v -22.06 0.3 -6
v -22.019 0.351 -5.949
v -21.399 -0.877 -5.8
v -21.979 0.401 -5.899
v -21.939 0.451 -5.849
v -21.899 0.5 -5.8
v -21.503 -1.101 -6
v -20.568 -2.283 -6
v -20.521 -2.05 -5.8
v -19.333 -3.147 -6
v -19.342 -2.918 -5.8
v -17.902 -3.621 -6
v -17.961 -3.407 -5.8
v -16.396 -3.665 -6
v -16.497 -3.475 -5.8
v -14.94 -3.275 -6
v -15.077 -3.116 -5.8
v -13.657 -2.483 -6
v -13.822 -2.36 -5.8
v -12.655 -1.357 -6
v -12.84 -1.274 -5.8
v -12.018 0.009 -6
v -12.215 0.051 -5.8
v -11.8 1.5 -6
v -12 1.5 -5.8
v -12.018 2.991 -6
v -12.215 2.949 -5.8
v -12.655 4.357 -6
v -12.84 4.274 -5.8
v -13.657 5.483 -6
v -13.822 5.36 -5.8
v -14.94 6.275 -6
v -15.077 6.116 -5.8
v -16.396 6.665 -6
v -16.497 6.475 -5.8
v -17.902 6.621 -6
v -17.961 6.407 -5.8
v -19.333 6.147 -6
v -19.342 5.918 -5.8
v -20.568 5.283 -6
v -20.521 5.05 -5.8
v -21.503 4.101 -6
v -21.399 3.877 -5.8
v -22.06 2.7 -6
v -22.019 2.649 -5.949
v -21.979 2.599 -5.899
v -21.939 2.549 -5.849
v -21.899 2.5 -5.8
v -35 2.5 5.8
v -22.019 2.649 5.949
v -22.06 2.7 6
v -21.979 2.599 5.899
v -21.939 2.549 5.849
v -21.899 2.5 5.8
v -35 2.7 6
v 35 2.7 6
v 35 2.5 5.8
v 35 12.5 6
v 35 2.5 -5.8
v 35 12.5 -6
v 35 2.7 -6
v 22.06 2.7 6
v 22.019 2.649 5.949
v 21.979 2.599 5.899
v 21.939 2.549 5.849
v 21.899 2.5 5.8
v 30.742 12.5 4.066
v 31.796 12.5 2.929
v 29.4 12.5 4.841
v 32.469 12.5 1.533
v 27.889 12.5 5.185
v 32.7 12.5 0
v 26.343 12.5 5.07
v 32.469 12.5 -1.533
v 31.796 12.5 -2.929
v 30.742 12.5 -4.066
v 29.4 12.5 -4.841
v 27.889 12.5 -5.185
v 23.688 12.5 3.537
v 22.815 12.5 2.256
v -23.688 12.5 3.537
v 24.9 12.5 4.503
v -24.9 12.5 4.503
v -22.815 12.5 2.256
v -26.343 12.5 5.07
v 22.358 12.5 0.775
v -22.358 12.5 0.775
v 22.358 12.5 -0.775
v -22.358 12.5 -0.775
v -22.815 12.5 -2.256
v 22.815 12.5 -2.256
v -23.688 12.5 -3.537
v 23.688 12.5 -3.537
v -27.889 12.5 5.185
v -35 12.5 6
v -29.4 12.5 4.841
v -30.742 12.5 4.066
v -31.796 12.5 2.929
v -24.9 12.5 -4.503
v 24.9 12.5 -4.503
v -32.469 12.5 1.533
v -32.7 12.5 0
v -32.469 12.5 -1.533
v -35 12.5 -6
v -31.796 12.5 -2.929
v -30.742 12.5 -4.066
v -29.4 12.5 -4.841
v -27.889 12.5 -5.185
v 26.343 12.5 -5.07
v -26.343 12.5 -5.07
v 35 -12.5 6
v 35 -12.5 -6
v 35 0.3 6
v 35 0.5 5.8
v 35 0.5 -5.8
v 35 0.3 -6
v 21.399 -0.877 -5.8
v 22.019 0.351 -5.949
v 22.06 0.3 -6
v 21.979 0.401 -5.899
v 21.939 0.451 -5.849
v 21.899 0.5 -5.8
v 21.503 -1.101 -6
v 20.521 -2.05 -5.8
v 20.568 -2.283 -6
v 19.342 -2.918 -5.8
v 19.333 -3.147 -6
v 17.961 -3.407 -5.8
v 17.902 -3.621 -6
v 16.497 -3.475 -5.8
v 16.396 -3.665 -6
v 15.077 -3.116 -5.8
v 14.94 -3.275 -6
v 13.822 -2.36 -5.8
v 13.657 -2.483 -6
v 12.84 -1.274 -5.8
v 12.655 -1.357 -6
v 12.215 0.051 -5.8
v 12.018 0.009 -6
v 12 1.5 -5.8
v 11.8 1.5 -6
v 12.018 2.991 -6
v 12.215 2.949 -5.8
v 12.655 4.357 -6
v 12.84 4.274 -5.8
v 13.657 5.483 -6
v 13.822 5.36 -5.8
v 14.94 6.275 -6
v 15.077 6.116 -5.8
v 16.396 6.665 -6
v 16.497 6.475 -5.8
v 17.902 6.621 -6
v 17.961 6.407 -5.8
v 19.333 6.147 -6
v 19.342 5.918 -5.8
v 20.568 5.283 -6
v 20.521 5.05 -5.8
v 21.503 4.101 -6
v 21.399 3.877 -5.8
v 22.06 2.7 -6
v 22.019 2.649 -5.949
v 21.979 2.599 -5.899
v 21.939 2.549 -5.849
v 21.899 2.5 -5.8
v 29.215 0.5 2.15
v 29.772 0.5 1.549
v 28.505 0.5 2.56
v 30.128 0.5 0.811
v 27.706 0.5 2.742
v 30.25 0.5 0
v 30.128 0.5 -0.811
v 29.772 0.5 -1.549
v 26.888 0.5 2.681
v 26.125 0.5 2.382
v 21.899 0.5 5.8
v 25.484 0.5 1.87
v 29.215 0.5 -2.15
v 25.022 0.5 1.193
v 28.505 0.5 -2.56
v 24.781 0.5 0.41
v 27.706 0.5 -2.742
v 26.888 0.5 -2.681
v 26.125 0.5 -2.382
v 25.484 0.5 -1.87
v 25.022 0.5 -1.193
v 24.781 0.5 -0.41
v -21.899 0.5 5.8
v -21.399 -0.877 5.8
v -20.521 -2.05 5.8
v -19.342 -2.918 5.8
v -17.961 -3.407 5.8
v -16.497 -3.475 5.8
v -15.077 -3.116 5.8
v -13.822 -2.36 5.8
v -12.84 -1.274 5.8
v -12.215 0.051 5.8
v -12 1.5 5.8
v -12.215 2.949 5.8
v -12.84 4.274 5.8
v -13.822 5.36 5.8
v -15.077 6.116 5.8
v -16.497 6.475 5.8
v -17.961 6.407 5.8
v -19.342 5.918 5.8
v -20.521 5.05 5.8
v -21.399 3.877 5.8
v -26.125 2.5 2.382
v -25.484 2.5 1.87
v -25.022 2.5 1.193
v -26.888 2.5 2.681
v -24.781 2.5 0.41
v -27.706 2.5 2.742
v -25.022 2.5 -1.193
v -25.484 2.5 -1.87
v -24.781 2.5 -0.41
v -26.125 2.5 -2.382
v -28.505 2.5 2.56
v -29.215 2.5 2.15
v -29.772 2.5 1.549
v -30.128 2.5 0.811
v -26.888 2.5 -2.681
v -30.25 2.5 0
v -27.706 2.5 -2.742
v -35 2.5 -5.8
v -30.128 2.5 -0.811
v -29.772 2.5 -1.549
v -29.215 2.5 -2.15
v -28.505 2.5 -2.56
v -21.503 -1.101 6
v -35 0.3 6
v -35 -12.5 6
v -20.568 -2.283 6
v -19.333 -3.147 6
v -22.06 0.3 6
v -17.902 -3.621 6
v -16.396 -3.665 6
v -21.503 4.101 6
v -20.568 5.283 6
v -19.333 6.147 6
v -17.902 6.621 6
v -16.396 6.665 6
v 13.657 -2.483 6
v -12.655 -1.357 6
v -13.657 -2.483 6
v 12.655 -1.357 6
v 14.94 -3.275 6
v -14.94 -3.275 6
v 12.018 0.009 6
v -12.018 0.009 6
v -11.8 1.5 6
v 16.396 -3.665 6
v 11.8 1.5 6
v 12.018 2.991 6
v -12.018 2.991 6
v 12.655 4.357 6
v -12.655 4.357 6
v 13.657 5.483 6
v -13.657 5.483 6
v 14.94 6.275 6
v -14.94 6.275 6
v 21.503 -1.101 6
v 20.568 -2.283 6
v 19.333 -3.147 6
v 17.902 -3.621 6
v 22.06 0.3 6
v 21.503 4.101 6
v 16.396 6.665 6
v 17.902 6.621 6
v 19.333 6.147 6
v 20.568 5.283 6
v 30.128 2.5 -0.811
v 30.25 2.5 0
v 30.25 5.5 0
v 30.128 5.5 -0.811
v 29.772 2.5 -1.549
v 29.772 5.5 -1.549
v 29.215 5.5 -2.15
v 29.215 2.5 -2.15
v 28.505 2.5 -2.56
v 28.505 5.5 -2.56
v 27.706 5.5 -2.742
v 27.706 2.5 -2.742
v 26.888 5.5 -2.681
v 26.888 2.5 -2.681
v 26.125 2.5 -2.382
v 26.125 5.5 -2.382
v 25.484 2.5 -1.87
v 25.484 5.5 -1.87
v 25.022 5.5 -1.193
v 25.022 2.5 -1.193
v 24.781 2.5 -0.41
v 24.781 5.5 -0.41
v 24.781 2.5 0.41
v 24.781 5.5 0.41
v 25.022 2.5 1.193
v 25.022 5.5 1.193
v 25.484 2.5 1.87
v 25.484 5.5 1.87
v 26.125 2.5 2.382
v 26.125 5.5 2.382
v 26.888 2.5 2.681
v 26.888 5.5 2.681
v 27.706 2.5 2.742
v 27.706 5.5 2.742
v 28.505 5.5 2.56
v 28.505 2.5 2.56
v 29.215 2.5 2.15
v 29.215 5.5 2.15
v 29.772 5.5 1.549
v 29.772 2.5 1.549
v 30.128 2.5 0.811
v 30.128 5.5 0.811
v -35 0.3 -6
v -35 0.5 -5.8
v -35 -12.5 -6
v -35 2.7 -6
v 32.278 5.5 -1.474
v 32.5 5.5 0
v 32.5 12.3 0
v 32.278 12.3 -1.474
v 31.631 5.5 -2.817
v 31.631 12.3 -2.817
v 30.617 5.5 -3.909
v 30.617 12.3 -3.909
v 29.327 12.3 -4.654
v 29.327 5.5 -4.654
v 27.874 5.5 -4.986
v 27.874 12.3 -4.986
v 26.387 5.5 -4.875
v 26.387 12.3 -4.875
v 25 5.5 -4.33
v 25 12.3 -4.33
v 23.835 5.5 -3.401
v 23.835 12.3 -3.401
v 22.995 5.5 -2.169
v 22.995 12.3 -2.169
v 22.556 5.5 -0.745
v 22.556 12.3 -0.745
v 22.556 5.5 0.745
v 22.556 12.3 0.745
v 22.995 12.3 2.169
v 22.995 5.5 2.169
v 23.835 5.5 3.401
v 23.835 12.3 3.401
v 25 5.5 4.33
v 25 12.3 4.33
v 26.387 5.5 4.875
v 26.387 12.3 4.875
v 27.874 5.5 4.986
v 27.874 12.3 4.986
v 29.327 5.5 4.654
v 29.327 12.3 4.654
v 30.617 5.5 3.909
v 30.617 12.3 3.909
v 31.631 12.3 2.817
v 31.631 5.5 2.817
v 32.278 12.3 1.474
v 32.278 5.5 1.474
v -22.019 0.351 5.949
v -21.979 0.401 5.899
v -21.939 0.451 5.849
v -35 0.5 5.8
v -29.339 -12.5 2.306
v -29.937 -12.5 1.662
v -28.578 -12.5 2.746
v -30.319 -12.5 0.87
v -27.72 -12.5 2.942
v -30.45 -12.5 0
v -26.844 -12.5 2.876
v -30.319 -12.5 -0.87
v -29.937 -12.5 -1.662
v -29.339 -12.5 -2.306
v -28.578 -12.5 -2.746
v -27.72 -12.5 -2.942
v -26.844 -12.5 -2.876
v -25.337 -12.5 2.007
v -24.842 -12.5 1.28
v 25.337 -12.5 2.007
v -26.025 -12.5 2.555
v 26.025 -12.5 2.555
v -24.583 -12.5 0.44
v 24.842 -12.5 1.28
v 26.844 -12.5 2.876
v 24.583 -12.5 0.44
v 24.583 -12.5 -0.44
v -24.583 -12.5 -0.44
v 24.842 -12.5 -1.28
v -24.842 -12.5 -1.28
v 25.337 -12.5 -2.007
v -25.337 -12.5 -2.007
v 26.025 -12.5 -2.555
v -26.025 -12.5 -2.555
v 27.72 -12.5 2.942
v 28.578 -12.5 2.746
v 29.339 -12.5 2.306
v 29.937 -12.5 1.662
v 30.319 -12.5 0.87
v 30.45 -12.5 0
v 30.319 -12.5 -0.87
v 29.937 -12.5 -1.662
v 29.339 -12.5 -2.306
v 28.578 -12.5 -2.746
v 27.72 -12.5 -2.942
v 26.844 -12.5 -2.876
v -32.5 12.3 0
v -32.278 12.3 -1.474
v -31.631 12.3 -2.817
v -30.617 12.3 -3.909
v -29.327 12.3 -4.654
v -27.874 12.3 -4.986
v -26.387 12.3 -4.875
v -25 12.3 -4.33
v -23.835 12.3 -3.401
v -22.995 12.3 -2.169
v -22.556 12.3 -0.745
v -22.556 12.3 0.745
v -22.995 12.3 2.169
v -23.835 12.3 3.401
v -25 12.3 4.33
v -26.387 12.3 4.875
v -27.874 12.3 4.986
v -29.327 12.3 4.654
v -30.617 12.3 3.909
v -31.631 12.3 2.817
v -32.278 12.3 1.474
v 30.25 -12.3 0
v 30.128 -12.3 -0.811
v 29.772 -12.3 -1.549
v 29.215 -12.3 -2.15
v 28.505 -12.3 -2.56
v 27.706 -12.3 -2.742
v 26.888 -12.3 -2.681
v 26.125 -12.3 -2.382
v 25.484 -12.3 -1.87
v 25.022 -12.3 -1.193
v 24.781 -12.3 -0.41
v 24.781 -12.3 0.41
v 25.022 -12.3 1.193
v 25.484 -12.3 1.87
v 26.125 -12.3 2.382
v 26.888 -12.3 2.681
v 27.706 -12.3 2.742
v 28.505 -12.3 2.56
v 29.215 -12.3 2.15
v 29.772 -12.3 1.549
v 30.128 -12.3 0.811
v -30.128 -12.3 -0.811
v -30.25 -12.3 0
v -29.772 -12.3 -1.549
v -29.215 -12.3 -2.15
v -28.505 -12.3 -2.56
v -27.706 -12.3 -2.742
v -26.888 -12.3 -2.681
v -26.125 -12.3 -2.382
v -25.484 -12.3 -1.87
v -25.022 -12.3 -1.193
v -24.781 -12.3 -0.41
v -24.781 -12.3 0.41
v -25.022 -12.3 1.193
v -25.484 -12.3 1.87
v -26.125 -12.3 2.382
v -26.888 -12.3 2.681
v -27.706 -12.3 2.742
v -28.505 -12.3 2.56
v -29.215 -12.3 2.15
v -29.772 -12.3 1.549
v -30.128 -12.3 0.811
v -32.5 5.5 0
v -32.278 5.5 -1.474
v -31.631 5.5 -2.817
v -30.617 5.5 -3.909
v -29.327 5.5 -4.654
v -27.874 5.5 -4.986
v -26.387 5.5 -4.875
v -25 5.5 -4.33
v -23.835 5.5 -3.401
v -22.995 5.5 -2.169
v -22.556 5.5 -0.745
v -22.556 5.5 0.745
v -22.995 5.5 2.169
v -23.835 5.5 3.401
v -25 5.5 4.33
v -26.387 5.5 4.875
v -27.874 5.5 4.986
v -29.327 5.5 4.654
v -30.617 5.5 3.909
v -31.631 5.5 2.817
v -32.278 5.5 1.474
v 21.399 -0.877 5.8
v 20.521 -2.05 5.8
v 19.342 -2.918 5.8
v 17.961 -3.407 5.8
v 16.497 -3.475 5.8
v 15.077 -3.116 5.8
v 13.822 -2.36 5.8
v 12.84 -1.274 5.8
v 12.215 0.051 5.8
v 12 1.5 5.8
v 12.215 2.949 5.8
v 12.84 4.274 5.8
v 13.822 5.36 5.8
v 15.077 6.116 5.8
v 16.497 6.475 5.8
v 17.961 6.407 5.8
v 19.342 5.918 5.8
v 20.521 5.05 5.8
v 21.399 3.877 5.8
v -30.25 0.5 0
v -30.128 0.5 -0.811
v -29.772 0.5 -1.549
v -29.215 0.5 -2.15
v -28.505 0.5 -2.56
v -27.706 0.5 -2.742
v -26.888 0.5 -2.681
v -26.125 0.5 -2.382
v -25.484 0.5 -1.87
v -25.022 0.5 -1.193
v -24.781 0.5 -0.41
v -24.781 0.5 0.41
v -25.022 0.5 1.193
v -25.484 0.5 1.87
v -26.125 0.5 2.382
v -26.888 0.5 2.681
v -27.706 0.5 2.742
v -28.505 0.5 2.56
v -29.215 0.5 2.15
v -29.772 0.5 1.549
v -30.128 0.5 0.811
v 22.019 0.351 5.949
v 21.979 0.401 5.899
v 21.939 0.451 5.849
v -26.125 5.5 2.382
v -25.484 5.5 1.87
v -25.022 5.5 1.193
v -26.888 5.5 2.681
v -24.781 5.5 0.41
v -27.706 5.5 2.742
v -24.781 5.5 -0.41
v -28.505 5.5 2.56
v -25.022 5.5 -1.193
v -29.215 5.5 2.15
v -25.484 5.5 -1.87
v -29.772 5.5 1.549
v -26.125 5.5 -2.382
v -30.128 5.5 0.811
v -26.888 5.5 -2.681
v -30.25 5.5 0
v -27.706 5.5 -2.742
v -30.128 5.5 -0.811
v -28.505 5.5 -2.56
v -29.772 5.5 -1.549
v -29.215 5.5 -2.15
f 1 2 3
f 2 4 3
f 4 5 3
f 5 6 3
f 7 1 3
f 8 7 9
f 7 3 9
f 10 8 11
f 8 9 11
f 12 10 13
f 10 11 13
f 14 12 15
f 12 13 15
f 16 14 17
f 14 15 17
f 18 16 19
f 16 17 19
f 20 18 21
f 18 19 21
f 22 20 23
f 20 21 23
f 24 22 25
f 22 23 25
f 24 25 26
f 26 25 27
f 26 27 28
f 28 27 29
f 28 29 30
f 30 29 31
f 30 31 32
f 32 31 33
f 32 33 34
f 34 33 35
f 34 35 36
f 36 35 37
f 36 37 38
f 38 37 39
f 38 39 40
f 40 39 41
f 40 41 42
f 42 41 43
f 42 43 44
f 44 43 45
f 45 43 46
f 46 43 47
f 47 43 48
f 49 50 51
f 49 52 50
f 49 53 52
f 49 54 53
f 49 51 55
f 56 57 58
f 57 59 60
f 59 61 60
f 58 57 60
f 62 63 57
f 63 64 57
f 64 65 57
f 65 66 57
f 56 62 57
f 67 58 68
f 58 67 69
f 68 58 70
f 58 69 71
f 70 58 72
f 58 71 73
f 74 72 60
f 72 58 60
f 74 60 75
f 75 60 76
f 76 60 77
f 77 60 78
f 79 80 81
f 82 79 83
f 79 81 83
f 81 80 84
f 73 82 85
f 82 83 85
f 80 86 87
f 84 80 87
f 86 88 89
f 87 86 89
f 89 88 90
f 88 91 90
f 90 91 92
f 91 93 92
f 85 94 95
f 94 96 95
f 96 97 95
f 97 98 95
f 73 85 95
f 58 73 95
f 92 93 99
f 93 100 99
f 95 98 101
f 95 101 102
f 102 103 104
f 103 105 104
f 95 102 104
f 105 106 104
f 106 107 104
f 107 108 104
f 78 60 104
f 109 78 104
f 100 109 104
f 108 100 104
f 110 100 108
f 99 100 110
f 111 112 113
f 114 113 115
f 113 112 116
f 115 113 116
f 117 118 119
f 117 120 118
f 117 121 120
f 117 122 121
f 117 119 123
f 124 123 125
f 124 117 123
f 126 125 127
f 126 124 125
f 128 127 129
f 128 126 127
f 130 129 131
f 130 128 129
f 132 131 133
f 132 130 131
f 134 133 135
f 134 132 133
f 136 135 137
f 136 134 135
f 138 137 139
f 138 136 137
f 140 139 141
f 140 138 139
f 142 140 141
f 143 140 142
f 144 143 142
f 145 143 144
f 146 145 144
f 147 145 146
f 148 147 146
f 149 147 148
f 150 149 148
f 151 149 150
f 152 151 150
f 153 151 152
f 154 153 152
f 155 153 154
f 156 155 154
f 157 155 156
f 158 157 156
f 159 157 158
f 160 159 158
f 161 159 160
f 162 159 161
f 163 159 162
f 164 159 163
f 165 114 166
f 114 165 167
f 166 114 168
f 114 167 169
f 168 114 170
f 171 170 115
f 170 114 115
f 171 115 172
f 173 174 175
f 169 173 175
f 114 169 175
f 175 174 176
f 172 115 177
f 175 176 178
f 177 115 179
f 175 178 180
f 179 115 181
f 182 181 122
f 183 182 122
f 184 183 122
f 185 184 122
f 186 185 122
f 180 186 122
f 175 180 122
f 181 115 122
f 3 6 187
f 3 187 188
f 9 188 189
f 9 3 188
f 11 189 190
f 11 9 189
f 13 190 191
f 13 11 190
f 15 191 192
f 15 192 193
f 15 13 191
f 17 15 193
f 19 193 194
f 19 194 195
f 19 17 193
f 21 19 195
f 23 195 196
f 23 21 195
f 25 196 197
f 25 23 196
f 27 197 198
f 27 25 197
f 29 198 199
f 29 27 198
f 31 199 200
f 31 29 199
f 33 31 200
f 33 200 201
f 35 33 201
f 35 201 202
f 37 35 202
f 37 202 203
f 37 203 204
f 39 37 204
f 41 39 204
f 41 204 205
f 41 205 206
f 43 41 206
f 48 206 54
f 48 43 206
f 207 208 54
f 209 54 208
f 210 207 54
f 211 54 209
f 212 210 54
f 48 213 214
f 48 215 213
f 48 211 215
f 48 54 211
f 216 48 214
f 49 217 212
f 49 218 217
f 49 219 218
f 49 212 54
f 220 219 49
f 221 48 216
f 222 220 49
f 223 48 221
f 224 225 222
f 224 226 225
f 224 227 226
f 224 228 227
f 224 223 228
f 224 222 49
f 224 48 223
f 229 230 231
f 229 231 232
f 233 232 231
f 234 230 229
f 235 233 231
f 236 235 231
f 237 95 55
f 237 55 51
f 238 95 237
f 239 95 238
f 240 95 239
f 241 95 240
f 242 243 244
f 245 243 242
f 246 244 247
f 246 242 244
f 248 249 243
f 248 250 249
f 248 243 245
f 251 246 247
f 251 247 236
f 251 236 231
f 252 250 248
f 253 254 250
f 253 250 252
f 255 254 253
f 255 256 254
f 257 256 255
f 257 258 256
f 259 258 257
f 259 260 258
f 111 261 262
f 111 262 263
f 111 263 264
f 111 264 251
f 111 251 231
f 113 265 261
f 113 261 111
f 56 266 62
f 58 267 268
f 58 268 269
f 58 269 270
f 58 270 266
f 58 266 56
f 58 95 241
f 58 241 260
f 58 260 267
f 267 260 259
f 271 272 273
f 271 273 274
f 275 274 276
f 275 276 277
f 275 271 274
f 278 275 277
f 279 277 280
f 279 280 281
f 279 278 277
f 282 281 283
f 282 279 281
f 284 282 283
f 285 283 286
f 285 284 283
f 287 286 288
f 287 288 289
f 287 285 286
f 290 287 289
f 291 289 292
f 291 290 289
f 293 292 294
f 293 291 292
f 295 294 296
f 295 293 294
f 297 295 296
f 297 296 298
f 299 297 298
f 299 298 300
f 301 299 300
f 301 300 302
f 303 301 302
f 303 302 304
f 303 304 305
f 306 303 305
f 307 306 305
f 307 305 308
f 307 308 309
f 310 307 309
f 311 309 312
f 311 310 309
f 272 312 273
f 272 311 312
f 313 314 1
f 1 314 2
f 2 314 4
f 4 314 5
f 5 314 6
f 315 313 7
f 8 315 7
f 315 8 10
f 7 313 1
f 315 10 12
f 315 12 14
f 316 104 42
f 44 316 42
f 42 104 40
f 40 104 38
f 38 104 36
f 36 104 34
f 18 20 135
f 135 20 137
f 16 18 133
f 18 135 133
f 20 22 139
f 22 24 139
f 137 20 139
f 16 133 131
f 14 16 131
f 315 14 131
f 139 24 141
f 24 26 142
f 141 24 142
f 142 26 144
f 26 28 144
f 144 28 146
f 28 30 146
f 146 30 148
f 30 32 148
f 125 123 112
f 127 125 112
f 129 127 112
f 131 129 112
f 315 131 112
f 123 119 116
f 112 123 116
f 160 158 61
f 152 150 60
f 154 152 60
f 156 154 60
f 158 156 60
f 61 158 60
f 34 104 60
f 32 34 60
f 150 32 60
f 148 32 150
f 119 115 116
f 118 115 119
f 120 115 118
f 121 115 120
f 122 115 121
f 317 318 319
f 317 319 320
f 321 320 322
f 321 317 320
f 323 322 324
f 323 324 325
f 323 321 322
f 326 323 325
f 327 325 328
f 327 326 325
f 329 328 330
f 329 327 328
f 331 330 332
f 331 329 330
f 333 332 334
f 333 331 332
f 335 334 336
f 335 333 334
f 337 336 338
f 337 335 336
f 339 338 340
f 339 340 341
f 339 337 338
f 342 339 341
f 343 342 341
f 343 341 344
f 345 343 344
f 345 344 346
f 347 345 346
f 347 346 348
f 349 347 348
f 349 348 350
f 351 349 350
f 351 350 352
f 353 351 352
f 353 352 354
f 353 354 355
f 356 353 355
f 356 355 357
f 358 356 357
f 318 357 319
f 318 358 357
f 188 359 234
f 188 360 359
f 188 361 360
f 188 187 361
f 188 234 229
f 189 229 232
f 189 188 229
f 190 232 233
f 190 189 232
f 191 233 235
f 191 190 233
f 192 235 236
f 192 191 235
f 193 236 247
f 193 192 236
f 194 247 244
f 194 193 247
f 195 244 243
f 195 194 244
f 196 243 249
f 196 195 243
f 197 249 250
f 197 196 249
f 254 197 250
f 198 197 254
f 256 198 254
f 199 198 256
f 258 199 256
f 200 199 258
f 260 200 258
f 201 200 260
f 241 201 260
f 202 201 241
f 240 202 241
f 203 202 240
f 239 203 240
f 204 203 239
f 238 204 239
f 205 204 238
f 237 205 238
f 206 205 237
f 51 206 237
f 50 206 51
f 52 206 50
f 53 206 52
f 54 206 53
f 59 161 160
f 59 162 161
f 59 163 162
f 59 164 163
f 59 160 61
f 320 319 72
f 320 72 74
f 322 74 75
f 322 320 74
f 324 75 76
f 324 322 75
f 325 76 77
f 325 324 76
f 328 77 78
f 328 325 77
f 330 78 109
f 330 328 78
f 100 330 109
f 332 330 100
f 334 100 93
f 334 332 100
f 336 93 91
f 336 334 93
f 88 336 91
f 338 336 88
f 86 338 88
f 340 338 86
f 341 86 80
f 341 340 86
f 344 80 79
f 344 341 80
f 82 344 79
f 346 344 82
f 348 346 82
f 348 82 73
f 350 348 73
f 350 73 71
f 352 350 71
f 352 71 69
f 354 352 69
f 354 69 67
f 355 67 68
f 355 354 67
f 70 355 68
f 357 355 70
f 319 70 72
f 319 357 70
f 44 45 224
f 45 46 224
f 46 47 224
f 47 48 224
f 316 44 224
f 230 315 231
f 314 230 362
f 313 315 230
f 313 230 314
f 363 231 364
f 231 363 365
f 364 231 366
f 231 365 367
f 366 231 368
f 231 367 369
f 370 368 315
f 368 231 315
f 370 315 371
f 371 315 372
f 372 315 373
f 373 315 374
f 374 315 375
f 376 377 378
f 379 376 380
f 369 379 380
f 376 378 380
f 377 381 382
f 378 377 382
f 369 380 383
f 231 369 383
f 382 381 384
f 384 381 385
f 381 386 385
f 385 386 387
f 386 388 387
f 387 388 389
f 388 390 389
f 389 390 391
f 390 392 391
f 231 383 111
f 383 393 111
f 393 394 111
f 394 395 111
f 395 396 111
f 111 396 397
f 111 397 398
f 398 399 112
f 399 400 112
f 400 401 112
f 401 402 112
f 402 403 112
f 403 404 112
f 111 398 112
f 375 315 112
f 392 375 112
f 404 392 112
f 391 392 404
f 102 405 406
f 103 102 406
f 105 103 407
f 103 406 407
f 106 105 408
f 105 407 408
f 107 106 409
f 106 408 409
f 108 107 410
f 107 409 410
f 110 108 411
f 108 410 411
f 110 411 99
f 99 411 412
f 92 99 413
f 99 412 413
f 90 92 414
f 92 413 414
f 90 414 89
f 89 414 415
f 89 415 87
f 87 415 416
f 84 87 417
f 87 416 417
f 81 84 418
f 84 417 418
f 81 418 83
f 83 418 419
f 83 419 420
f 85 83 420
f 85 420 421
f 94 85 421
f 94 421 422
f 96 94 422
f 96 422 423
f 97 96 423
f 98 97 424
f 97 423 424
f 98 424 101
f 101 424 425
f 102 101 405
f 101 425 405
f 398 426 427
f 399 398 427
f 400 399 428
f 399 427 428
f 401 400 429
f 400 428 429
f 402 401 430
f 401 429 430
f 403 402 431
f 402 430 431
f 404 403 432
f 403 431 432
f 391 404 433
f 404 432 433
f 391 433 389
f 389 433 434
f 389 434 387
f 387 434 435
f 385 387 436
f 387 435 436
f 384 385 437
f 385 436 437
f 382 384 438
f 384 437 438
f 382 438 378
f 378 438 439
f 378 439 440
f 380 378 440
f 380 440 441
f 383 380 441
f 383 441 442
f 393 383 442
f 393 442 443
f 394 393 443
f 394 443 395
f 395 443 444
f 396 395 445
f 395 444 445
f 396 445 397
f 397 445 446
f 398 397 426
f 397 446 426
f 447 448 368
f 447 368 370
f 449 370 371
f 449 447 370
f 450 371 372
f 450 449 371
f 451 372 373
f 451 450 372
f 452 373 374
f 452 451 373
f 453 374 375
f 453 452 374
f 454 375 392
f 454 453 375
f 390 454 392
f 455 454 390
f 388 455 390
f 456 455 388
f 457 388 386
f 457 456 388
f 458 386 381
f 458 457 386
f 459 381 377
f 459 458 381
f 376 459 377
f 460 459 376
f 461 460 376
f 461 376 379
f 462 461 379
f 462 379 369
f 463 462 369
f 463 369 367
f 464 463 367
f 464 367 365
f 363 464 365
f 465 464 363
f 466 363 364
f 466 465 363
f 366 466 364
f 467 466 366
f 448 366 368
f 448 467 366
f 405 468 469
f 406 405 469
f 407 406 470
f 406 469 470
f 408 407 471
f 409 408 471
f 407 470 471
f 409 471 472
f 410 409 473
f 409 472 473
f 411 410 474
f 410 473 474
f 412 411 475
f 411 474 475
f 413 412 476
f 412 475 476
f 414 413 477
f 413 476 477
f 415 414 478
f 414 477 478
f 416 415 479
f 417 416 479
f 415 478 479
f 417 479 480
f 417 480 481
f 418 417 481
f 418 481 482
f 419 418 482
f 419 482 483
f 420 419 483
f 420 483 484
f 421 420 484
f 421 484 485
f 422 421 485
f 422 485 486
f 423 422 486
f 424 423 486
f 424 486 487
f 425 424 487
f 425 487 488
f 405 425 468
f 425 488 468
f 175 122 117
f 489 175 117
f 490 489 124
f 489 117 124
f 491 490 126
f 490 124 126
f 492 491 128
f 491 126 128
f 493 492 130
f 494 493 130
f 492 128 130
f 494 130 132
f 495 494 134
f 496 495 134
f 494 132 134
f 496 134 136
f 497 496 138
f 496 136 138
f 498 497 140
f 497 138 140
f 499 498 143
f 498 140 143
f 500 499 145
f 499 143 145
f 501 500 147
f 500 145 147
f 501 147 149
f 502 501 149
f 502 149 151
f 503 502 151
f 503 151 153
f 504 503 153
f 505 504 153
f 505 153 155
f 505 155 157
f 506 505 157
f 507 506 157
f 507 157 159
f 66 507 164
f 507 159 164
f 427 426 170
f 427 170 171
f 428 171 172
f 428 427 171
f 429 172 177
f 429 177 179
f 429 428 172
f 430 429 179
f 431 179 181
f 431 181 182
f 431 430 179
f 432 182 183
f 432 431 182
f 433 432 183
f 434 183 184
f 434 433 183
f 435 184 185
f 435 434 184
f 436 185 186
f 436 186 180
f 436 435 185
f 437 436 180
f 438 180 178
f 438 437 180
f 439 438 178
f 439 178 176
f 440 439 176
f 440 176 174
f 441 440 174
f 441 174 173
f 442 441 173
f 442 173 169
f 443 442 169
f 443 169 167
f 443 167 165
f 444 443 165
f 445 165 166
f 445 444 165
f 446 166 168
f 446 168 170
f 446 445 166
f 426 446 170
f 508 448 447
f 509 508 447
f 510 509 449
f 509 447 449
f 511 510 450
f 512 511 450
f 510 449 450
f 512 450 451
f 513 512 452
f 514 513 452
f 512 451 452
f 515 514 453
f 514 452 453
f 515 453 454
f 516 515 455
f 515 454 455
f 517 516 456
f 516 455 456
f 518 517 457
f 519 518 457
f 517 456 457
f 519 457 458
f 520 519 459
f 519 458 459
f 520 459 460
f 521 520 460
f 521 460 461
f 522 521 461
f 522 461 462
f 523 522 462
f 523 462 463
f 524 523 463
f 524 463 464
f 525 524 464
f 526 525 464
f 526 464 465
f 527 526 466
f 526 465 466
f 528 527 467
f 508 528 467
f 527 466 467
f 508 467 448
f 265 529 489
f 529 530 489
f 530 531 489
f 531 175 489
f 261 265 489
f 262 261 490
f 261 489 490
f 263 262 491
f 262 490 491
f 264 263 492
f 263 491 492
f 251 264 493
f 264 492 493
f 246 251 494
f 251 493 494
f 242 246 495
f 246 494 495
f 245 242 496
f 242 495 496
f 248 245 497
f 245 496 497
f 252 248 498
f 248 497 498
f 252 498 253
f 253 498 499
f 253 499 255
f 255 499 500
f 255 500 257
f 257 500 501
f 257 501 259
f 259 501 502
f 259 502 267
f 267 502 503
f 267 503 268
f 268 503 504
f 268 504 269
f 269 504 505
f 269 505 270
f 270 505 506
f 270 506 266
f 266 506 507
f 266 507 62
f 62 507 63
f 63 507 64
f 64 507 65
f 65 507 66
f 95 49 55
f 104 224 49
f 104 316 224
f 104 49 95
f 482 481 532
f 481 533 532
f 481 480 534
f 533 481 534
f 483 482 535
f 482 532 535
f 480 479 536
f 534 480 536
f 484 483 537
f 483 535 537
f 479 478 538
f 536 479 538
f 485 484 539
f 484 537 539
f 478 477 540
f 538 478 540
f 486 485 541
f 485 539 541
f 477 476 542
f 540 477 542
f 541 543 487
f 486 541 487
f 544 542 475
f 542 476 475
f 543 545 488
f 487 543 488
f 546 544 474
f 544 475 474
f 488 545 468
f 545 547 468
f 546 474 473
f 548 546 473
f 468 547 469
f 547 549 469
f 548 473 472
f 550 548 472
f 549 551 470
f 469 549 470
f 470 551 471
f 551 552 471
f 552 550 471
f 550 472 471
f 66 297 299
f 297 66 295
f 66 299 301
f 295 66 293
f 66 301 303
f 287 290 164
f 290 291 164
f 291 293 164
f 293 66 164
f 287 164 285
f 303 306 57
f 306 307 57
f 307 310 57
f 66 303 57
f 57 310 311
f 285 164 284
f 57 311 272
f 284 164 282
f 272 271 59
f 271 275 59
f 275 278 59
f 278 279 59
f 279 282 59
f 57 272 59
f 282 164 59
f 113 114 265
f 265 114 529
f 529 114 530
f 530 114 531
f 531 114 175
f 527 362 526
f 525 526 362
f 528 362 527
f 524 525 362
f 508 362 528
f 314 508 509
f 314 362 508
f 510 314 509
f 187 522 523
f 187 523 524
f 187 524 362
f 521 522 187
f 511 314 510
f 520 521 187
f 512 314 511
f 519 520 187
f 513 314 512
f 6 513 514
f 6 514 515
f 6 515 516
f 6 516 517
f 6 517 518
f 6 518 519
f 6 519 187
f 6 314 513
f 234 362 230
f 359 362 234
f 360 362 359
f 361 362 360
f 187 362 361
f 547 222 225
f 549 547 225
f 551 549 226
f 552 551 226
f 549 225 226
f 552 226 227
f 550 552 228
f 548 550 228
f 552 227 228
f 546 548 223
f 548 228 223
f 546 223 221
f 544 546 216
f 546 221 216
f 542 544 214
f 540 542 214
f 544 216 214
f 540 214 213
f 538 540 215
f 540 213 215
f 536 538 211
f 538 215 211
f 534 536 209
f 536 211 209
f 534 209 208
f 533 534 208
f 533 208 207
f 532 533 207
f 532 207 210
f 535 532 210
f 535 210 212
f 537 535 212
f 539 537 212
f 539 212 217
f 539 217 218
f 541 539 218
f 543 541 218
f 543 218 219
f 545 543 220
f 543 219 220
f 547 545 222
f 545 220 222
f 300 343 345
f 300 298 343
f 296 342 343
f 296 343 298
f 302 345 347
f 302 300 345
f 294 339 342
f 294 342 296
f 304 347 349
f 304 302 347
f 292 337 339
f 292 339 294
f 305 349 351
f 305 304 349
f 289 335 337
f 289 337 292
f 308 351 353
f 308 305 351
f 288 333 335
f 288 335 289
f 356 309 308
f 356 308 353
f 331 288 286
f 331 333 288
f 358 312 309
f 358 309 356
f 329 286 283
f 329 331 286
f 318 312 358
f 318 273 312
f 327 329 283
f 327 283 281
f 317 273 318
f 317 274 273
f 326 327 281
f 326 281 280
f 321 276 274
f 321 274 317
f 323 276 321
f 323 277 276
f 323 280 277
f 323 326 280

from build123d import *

# Parameters (mm, degrees)
BOSS_EXTRUDE1_DEPTH      = 6
BOSS_EXTRUDE1_DEPTH_BACK = 6
CHAMFER1_SIZE            = 0.2


with BuildPart() as part:
    # Sketch3 → Boss-Extrude1 (new, two sides: drawn at the far end of the back side and taken through both)
    with BuildSketch(Plane.XY.offset(-BOSS_EXTRUDE1_DEPTH_BACK)):
        with BuildLine():
            Line((-35, 12.5), (0, 12.5))
            Line((0, 12.5), (0, -12.5))
            Line((0, -12.5), (-35, -12.5))
            Line((-35, -12.5), (-35, 0.5))
            Line((-35, 0.5), (-21.898979486, 0.5))
            ThreePointArc((-21.898979486, 0.5), (-12, 1.5), (-21.898979486, 2.5))
            Line((-21.898979486, 2.5), (-35, 2.5))
            Line((-35, 2.5), (-35, 12.5))
        make_face()
    extrude(amount=BOSS_EXTRUDE1_DEPTH + BOSS_EXTRUDE1_DEPTH_BACK)

    # Sketch5 → Cut-Revolve1 (revolve, cut)
    with BuildSketch(Plane.XY):
        Polygon((-32.5, 12.5), (-32.5, 5.5), (-30.25, 5.5), (-30.25, -12.5), (-27.5, -12.5), (-27.5, 1.5), (-27.5, 5.5), (-27.5, 12.5), align=None)
    revolve(axis=Axis((-27.5, 12.5, 0), (0, -1, 0)), mode=Mode.SUBTRACT)

    # Chamfer1
    chamfer1_edges = [part.edges().sort_by_distance(p)[0] for p in [
        (-12, 1.5, 6),
        (-28.449489743, 0.5, 6),
        (-28.449489743, 0.5, -6),
        (-12, 1.5, -6),
        (-28.449489743, 2.5, -6),
        (-24.75, -12.5, 0),
        (-22.5, 12.5, 0),
        (-28.449489743, 2.5, 6),
    ]]
    chamfer(chamfer1_edges, length=CHAMFER1_SIZE)

    # Mirror1: part across plane


with BuildPart() as part_1:
    add(part.part)
    add(part.part.mirror(Plane(origin=(0, 0, 0), x_dir=(0, 0, 1), z_dir=(1, 0, 0))))


solid = part_1.part
